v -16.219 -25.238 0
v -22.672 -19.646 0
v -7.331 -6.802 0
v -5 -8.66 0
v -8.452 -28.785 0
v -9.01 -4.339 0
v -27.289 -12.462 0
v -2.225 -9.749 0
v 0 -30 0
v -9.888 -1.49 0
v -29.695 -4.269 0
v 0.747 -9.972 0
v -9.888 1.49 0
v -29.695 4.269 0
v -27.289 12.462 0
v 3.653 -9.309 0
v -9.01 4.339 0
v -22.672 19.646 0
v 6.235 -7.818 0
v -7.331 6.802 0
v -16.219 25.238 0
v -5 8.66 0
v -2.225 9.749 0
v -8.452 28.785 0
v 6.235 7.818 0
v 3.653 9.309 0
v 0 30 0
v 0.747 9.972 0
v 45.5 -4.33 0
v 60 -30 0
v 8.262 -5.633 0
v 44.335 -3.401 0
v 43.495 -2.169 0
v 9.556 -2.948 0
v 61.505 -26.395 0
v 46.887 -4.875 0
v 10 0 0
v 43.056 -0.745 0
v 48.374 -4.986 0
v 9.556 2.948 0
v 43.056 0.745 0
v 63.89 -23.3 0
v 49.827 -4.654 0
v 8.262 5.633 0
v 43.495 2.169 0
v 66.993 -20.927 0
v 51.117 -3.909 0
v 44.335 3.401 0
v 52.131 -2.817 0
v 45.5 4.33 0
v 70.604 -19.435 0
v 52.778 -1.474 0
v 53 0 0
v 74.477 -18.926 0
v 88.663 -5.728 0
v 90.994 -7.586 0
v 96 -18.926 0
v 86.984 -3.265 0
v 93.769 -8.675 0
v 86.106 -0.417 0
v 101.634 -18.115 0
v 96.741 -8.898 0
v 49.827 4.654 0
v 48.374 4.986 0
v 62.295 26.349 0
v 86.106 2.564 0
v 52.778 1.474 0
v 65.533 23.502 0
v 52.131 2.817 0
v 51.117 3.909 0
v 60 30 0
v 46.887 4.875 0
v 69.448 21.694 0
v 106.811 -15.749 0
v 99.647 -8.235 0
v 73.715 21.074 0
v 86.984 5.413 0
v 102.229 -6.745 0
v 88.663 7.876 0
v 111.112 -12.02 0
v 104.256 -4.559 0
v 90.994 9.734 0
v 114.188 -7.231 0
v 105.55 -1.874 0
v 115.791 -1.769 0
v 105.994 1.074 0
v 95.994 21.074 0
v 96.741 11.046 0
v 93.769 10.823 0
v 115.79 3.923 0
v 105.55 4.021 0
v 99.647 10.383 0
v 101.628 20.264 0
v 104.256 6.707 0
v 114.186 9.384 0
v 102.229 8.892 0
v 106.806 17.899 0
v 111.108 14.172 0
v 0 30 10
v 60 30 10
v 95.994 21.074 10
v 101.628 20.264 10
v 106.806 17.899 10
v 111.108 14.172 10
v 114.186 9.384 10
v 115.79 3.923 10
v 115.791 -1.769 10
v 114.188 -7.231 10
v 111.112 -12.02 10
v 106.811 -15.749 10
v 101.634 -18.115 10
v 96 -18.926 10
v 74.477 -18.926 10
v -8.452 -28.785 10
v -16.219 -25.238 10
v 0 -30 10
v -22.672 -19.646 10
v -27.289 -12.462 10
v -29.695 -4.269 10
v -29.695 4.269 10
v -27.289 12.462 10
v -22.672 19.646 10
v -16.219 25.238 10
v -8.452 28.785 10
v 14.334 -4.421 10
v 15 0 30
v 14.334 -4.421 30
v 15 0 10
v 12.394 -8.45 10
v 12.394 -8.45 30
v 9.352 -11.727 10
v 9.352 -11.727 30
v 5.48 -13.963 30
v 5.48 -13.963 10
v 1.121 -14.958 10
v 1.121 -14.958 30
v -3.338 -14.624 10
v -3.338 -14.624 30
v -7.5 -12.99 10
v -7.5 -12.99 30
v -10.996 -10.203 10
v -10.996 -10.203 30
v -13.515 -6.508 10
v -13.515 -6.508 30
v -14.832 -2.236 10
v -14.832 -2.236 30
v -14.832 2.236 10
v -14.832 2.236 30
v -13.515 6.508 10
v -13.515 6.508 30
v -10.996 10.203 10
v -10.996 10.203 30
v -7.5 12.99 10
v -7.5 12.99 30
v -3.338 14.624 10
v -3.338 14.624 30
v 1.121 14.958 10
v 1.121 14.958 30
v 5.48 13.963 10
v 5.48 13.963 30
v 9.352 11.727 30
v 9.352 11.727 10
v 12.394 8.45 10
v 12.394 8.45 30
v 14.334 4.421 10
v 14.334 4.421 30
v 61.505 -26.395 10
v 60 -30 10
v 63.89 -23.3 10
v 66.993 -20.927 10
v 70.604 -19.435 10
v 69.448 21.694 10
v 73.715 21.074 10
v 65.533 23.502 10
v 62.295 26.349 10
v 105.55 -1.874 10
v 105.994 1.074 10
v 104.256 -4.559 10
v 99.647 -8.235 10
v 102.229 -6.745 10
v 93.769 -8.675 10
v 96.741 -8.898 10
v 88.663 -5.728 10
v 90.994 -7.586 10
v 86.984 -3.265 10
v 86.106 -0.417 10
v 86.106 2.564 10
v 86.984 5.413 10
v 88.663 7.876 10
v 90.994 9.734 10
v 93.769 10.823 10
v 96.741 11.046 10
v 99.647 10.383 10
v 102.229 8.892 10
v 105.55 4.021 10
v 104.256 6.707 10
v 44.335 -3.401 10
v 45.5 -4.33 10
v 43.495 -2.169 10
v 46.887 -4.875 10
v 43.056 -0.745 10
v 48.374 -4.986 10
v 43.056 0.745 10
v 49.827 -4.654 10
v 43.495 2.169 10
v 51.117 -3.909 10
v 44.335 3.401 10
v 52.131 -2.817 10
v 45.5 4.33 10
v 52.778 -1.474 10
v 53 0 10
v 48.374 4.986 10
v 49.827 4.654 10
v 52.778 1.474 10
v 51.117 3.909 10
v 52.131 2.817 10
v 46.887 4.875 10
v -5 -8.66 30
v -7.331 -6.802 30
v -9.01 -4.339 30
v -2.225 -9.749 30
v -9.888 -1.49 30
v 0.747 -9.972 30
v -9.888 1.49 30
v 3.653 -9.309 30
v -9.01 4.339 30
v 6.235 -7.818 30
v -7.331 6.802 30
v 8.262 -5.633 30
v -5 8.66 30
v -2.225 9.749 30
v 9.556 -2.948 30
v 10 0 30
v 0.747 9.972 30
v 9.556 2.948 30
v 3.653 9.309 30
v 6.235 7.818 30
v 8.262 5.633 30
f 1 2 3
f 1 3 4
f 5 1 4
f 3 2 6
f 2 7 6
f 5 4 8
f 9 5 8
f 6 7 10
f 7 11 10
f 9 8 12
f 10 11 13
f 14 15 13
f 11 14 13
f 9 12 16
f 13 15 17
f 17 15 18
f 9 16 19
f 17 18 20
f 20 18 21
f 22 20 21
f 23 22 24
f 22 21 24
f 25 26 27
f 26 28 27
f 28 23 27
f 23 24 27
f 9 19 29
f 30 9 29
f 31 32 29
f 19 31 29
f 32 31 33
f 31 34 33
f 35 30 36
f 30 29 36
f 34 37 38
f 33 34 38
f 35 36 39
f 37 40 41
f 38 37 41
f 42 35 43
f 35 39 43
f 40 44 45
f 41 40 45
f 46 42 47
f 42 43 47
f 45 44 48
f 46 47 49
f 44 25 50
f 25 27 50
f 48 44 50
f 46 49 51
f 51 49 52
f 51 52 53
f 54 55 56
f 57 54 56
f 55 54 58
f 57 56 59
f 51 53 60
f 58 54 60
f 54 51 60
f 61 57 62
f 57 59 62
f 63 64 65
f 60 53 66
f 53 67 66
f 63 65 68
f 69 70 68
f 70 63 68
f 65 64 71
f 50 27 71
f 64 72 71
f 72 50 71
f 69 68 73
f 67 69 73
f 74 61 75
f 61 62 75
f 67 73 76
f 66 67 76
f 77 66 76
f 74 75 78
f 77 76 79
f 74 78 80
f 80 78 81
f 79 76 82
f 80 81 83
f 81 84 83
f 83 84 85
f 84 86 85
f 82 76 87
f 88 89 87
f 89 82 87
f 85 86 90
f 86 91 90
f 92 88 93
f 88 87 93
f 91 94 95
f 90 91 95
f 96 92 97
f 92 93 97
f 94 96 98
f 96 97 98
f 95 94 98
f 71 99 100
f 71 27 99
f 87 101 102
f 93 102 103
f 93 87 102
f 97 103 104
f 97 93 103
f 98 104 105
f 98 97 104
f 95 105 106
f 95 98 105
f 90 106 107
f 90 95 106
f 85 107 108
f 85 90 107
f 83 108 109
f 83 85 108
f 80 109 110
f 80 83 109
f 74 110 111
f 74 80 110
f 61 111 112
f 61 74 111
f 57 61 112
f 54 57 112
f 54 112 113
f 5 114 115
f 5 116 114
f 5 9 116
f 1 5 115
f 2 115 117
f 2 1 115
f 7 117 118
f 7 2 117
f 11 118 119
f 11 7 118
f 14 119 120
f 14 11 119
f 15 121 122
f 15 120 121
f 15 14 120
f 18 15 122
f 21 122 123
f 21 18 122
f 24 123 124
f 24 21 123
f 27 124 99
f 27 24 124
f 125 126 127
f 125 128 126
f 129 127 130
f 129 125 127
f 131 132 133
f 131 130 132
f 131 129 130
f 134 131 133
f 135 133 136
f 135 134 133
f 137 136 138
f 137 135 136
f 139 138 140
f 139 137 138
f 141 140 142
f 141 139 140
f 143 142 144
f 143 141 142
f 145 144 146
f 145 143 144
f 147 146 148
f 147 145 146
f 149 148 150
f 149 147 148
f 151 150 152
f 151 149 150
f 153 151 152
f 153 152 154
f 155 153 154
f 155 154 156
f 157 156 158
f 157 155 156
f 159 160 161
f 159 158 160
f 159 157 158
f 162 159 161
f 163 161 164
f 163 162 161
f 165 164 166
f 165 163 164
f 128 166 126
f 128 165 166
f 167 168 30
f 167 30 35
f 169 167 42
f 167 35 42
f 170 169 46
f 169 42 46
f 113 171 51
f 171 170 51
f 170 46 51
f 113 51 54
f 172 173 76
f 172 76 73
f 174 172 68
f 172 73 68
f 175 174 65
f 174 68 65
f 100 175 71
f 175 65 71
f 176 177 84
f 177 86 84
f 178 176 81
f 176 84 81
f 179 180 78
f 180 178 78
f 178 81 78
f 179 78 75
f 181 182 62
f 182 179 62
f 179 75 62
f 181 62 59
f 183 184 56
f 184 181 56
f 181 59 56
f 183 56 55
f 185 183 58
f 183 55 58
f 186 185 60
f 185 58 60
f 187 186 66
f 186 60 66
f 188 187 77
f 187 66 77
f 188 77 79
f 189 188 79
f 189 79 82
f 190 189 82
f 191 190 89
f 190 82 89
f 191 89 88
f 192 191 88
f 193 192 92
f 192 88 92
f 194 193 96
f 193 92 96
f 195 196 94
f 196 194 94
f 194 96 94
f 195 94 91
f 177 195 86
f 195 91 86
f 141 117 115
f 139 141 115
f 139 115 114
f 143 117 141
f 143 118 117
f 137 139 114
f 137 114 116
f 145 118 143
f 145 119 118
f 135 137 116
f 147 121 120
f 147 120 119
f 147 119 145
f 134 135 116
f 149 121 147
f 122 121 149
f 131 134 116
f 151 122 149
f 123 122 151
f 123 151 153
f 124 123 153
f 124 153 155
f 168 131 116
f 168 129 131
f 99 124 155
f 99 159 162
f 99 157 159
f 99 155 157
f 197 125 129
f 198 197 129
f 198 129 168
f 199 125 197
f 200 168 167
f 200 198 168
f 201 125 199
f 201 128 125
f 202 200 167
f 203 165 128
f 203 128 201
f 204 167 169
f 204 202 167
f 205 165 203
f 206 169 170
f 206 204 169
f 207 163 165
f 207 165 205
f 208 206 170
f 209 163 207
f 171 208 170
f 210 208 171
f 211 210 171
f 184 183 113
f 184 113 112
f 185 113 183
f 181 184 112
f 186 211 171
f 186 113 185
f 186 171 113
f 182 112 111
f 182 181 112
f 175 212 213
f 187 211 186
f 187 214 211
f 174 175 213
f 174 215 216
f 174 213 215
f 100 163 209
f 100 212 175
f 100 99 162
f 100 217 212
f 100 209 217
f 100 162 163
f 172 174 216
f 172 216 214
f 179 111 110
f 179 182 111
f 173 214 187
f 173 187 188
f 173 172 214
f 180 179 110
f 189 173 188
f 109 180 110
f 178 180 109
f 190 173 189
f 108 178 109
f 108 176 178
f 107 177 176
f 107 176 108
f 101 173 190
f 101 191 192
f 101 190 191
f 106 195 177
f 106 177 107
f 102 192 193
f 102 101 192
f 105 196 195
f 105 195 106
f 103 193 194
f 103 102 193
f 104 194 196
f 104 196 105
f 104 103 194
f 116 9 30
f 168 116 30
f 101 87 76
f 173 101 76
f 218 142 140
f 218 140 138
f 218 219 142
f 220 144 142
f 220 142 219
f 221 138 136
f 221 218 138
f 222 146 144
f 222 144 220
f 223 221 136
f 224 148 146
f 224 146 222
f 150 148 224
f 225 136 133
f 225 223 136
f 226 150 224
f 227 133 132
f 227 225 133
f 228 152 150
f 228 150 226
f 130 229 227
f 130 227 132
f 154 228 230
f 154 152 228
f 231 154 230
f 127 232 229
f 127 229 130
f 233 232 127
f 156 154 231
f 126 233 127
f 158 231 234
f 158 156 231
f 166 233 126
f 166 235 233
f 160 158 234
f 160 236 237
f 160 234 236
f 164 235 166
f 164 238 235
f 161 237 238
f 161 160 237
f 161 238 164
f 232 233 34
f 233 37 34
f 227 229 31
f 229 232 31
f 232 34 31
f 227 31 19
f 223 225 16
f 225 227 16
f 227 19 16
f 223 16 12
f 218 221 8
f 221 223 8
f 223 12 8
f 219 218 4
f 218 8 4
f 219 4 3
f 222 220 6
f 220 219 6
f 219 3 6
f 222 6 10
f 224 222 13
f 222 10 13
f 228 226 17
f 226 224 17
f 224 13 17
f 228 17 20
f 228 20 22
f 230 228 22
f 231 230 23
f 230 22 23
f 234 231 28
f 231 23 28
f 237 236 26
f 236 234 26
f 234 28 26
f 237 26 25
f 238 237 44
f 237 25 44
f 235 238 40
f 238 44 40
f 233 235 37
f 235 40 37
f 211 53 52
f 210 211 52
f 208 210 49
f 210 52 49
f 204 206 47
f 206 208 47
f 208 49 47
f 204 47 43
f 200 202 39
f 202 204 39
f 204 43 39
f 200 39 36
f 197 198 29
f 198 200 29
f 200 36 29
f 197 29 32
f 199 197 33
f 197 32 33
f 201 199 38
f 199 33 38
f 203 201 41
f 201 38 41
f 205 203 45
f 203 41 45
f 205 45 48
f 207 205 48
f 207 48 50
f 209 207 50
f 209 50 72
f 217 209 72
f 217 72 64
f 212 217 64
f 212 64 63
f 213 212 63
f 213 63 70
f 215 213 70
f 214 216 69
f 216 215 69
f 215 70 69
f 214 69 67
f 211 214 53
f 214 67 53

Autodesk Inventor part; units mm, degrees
ref_plane "YZ Plane" through (0, 0, 0) normal (1, 0, 0) x (0, 1, 0)
ref_plane "XZ Plane" through (0, 0, 0) normal (0, 1, 0) x (-1, 0, 0)
ref_plane "XY Plane" through (0, 0, 0) normal (0, 0, 1) x (1, 0, 0)
sketch "Sketch1" plane through (0, 0, 0) normal (0, 0, 1) x (1, 0, 0)
  circle A0 centre (0, 0) radius 15
  circle A1 centre (0, 0) radius 10
  circle A2 centre (0, 0) radius 30
  circle A3 centre (95.994, 1.0738) radius 10
  circle A4 centre (95.994, 1.0738) radius 20
  circle A5 centre (48, 0) radius 5
  line L0 (96, -18.9262) -> (74.477, -18.9262)
  line L1 (0, -30) -> (60, -30)
  arc A6 (74.477, -18.9262) -> (60, -30) centre (74.477, -33.9262) ccw
  line L2 (0, 30) -> (60, 30)
  line L3 (95.994, 21.0738) -> (73.7153, 21.0738)
  arc A7 (60, 30) -> (73.7153, 21.0738) centre (73.7153, 36.0738) ccw
  dimension "d0" = 30
  dimension "d1" = 20
  dimension "d2" = 60
  dimension "d6" = 20
  dimension "d7" = 40
  dimension "d8" = 10
  dimension "d9" = 48
  dimension "d10" = 96
  dimension "d11" = 60
  dimension "d12" = 30
  dimension "d13" = 60
  dimension "d14" = 30
extrude "Extrusion1" add sketch "Sketch1" along normal blind 10 contours A0 | A2 | A4 | A2 L2 A7 L3 A4 L0 A6 L1
sketch "Sketch2" plane through (0, 0, 10) normal (0, 0, 1) x (1, 0, 0)
  circle A0 centre (0, 0) radius 10
  circle A1 centre (0, 0) radius 15
  dimension "d17" = 20
  dimension "d18" = 30
extrude "Extrusion2" add sketch "Sketch2" along normal blind 20
properties part number "4-3"
